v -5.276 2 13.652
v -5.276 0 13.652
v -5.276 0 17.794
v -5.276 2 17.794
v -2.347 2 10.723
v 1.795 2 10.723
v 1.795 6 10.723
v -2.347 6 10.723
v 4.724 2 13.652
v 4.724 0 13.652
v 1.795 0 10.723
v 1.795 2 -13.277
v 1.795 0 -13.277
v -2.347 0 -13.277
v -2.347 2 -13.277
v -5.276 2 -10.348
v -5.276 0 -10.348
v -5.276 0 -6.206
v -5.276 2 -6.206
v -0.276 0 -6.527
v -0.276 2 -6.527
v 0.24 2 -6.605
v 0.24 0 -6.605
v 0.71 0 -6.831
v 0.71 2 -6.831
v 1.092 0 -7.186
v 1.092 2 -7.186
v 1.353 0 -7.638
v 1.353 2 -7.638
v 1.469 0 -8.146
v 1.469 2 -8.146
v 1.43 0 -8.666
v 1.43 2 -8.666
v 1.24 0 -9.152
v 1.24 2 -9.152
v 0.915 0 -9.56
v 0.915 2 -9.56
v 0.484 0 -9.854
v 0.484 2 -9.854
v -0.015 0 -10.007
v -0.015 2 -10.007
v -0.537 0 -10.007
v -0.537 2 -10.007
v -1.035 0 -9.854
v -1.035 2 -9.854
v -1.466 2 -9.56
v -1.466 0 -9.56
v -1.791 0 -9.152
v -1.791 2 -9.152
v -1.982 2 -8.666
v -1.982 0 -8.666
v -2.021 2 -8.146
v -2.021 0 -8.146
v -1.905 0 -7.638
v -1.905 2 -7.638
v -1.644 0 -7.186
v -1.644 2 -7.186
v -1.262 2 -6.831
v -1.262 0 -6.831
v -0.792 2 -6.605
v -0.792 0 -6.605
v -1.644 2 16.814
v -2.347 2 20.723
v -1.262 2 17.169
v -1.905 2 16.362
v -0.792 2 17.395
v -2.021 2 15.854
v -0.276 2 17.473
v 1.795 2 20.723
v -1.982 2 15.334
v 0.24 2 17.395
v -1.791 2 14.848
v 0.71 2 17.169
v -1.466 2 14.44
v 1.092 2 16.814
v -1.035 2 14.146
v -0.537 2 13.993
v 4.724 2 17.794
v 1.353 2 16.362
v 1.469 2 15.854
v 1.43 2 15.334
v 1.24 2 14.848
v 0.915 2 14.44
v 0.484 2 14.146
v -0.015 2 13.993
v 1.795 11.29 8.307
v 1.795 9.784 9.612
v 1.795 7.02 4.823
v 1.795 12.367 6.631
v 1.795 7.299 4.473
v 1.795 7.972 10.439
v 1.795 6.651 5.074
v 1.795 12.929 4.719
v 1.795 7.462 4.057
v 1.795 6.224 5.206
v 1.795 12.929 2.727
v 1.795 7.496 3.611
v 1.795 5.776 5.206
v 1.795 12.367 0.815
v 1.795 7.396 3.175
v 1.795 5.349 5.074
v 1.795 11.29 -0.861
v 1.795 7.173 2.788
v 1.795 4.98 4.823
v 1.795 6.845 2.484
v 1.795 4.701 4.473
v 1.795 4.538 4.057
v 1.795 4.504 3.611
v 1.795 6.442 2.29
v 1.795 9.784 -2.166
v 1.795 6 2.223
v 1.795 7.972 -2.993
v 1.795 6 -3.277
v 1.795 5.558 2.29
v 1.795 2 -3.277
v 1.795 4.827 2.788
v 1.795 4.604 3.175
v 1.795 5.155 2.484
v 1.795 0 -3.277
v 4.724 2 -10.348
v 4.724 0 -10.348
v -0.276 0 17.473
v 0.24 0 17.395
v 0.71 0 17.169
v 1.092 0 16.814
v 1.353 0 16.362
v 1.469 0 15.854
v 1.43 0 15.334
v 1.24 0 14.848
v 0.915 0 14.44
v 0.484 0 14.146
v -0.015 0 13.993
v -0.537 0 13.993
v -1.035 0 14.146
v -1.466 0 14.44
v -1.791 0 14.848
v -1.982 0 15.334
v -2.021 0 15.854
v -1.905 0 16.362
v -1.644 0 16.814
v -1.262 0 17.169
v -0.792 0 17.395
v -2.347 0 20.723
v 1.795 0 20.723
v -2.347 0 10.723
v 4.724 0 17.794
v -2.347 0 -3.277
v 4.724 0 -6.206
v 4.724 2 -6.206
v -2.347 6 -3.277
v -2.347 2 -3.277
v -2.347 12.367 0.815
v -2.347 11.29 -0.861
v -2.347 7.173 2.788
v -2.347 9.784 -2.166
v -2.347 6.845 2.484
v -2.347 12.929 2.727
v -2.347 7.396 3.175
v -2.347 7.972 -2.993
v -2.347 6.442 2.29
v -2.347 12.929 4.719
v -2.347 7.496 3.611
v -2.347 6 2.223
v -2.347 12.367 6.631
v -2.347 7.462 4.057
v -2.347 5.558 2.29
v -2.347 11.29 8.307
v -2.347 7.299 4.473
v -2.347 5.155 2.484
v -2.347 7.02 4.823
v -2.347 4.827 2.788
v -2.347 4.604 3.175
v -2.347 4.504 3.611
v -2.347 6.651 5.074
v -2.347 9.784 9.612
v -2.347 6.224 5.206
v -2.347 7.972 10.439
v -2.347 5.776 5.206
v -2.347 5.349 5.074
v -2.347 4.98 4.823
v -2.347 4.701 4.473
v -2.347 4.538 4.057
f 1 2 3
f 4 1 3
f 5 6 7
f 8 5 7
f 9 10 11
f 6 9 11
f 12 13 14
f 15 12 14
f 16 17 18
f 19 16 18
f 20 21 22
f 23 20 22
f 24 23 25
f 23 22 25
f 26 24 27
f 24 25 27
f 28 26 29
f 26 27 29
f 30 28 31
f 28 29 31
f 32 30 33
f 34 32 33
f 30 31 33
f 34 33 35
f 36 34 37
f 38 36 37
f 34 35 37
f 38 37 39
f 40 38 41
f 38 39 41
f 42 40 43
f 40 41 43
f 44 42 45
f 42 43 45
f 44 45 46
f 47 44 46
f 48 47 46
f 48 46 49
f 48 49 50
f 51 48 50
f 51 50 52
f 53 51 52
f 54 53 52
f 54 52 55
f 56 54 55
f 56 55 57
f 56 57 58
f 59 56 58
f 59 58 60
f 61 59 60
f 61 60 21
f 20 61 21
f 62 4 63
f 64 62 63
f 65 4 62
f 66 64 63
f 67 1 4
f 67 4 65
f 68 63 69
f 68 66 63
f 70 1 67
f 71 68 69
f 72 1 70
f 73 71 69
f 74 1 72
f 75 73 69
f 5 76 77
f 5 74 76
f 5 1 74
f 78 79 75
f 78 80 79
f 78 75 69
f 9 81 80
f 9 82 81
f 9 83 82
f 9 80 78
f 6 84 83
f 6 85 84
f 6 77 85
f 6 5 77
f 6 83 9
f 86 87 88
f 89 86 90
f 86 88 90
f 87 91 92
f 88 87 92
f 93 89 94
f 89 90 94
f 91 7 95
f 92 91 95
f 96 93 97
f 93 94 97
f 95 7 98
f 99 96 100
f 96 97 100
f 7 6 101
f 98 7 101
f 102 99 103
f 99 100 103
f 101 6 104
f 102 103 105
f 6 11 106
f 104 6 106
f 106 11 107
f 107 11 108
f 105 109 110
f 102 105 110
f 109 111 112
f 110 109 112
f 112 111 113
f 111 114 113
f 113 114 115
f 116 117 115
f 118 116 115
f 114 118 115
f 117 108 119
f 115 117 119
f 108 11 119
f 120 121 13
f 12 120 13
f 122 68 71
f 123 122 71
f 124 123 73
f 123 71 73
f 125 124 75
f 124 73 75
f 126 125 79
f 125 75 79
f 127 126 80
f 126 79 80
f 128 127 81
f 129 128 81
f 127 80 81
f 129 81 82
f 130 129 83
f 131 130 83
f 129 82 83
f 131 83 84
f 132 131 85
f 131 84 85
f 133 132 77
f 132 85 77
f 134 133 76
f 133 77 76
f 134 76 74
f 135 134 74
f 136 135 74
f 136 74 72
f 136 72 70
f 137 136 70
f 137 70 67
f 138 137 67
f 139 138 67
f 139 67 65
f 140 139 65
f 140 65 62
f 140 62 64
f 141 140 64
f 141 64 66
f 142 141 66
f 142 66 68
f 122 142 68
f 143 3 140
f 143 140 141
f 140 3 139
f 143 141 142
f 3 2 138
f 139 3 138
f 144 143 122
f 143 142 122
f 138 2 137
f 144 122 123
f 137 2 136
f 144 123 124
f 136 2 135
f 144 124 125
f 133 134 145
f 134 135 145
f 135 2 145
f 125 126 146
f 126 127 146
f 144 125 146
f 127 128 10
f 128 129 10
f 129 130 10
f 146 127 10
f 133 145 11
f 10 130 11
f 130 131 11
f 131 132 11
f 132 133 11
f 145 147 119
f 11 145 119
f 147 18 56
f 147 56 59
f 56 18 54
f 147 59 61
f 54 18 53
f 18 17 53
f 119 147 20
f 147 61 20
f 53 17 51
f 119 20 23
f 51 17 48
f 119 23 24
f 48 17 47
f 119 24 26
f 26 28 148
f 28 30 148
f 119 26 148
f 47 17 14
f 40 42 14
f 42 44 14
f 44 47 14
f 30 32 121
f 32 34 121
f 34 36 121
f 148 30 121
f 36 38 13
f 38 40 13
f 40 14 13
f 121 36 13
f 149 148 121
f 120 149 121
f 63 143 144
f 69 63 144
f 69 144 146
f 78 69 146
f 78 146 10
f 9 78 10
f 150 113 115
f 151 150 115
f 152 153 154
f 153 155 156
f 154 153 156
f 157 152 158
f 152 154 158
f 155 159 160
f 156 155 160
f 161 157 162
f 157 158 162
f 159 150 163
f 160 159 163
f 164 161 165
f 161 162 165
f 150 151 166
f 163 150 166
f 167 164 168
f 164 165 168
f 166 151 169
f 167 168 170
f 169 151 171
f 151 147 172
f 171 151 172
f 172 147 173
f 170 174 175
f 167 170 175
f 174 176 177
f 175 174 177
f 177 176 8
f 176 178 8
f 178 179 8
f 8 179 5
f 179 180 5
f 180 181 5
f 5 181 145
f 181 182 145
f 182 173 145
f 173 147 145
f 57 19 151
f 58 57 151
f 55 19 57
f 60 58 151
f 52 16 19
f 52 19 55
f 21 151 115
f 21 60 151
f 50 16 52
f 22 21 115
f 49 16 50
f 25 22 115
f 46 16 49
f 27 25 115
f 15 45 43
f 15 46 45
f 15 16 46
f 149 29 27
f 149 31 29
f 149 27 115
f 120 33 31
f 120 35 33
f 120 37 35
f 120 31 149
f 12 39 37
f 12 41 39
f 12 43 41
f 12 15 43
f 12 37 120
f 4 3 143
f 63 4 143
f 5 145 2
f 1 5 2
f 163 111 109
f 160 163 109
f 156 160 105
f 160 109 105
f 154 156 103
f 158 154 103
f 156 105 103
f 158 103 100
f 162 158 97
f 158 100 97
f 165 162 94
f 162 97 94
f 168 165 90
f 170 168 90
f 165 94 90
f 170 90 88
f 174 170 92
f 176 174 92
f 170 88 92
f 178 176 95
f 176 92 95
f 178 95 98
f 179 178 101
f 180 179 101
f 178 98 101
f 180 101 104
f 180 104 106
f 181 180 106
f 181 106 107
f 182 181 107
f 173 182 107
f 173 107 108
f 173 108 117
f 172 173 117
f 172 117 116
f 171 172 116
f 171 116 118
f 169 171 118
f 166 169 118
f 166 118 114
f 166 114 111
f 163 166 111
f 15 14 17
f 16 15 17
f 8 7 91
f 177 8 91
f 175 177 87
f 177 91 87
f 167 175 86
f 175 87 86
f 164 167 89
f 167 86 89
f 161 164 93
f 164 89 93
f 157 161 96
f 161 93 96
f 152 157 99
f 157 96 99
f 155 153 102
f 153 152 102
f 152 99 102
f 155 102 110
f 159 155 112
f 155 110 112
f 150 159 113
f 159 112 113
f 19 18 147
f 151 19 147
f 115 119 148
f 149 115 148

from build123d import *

# Parameters (mm, degrees)
BOSS_EXTRU_1_DEPTH             = 2
BOSS_EXTRU_2_REACH             = 23.477
BOSS_EXTRU_2_DIRECTION_2_REACH = 23.477
ESQUISSE6_R                    = 1.5
ENL_V_MAT_EXTRU_3_DEPTH        = 26.464516662
ESQUISSE7_R                    = 1.75
ENL_V_MAT_EXTRU_4_DEPTH        = 25.047357729


with BuildPart() as part:
    # Esquisse1 → Boss.-Extru.1 (new body)
    with BuildSketch(Plane(origin=(0, 0, 0), x_dir=(1, 0, 0), z_dir=(0, 1, 0))):
        Polygon((1.795292522, 13.277027027), (-2.346843102, 13.277027027), (-5.27577529, 10.348094839), (-5.27577529, 6.205959215), (-2.346843102, 3.277027027), (-2.346843102, -10.722972973), (-5.27577529, -13.651905161), (-5.27577529, -17.794040785), (-2.346843102, -20.722972973), (1.795292522, -20.722972973), (4.72422471, -17.794040785), (4.72422471, -13.651905161), (1.795292522, -10.722972973), (1.795292522, 3.277027027), (4.72422471, 6.205959215), (4.72422471, 10.348094839), align=None)
    extrude(amount=BOSS_EXTRU_1_DEPTH)

    # Boss.-Extru.2: up to this face of the body (flat: up to its plane)
    boss_extru_2_end = Plane(part.part.faces().sort_by_distance((1.795292522, 1, 3.722972973))[0])
    # Esquisse3 → Boss.-Extru.2 (add, up to the picked face)
    with BuildSketch(Plane(origin=(0, 0, 0), x_dir=(0, 0, -1), z_dir=(1, 0, 0)), mode=Mode.PRIVATE) as boss_extru_2_sk1:
        with BuildLine():
            Line((-10.722972973, 0), (-10.722972973, 6))
            ThreePointArc((-10.722972973, 6), (-3.722972973, 13), (3.277027027, 6))
            Line((3.277027027, 6), (3.277027027, 0))
            Line((3.277027027, 0), (-10.722972973, 0))
        make_face()
    boss_extru_2_tool1 = split(extrude(boss_extru_2_sk1.sketch, amount=BOSS_EXTRU_2_REACH, mode=Mode.PRIVATE), bisect_by=boss_extru_2_end, keep=Keep.BOTH, mode=Mode.PRIVATE)
    add(boss_extru_2_tool1.solids().sort_by(Axis((0, 5.855045, 3.722973), (1, 0, 0)))[0])

    # Boss.-Extru.2 direction 2: up to this face of the body (flat: up to its plane)
    boss_extru_2_direction_2_end = Plane(part.part.faces().sort_by_distance((-2.346843102, 1, 3.722972973))[0])
    # Esquisse3 → Boss.-Extru.2 direction 2 (add, up to the picked face)
    with BuildSketch(Plane(origin=(0, 0, 0), x_dir=(0, 0, -1), z_dir=(1, 0, 0)), mode=Mode.PRIVATE) as boss_extru_2_direction_2_sk1:
        with BuildLine():
            Line((-10.722972973, 0), (-10.722972973, 6))
            ThreePointArc((-10.722972973, 6), (-3.722972973, 13), (3.277027027, 6))
            Line((3.277027027, 6), (3.277027027, 0))
            Line((3.277027027, 0), (-10.722972973, 0))
        make_face()
    boss_extru_2_direction_2_tool1 = split(extrude(boss_extru_2_direction_2_sk1.sketch, amount=-BOSS_EXTRU_2_DIRECTION_2_REACH, mode=Mode.PRIVATE), bisect_by=boss_extru_2_direction_2_end, keep=Keep.BOTH, mode=Mode.PRIVATE)
    add(boss_extru_2_direction_2_tool1.solids().sort_by(Axis((0, 5.855045, 3.722973), (-1, 0, 0)))[0])

    # Esquisse6 → Enlèv. mat.-Extru.3 (cut, through all)
    with BuildSketch(Plane(origin=(1.795292522, 0, 0), x_dir=(0, 0, -1), z_dir=(1, 0, 0))):
        with Locations((-3.722972973, 6)):
            Circle(ESQUISSE6_R)
    extrude(amount=-ENL_V_MAT_EXTRU_3_DEPTH, mode=Mode.SUBTRACT)

    # Esquisse7 → Enlèv. mat.-Extru.4 (cut, through all)
    with BuildSketch(Plane(origin=(0, 2, 0), x_dir=(1, 0, 0), z_dir=(0, 1, 0))):
        with Locations(Location((-0.27577529, -15.722972973, 0), (0, 0, 270))):
            Circle(ESQUISSE7_R)
        with Locations(Location((-0.27577529, 8.277027027, 0), (0, 0, 270))):
            Circle(ESQUISSE7_R)
    extrude(amount=-ENL_V_MAT_EXTRU_4_DEPTH, mode=Mode.SUBTRACT)


solid = part.part
